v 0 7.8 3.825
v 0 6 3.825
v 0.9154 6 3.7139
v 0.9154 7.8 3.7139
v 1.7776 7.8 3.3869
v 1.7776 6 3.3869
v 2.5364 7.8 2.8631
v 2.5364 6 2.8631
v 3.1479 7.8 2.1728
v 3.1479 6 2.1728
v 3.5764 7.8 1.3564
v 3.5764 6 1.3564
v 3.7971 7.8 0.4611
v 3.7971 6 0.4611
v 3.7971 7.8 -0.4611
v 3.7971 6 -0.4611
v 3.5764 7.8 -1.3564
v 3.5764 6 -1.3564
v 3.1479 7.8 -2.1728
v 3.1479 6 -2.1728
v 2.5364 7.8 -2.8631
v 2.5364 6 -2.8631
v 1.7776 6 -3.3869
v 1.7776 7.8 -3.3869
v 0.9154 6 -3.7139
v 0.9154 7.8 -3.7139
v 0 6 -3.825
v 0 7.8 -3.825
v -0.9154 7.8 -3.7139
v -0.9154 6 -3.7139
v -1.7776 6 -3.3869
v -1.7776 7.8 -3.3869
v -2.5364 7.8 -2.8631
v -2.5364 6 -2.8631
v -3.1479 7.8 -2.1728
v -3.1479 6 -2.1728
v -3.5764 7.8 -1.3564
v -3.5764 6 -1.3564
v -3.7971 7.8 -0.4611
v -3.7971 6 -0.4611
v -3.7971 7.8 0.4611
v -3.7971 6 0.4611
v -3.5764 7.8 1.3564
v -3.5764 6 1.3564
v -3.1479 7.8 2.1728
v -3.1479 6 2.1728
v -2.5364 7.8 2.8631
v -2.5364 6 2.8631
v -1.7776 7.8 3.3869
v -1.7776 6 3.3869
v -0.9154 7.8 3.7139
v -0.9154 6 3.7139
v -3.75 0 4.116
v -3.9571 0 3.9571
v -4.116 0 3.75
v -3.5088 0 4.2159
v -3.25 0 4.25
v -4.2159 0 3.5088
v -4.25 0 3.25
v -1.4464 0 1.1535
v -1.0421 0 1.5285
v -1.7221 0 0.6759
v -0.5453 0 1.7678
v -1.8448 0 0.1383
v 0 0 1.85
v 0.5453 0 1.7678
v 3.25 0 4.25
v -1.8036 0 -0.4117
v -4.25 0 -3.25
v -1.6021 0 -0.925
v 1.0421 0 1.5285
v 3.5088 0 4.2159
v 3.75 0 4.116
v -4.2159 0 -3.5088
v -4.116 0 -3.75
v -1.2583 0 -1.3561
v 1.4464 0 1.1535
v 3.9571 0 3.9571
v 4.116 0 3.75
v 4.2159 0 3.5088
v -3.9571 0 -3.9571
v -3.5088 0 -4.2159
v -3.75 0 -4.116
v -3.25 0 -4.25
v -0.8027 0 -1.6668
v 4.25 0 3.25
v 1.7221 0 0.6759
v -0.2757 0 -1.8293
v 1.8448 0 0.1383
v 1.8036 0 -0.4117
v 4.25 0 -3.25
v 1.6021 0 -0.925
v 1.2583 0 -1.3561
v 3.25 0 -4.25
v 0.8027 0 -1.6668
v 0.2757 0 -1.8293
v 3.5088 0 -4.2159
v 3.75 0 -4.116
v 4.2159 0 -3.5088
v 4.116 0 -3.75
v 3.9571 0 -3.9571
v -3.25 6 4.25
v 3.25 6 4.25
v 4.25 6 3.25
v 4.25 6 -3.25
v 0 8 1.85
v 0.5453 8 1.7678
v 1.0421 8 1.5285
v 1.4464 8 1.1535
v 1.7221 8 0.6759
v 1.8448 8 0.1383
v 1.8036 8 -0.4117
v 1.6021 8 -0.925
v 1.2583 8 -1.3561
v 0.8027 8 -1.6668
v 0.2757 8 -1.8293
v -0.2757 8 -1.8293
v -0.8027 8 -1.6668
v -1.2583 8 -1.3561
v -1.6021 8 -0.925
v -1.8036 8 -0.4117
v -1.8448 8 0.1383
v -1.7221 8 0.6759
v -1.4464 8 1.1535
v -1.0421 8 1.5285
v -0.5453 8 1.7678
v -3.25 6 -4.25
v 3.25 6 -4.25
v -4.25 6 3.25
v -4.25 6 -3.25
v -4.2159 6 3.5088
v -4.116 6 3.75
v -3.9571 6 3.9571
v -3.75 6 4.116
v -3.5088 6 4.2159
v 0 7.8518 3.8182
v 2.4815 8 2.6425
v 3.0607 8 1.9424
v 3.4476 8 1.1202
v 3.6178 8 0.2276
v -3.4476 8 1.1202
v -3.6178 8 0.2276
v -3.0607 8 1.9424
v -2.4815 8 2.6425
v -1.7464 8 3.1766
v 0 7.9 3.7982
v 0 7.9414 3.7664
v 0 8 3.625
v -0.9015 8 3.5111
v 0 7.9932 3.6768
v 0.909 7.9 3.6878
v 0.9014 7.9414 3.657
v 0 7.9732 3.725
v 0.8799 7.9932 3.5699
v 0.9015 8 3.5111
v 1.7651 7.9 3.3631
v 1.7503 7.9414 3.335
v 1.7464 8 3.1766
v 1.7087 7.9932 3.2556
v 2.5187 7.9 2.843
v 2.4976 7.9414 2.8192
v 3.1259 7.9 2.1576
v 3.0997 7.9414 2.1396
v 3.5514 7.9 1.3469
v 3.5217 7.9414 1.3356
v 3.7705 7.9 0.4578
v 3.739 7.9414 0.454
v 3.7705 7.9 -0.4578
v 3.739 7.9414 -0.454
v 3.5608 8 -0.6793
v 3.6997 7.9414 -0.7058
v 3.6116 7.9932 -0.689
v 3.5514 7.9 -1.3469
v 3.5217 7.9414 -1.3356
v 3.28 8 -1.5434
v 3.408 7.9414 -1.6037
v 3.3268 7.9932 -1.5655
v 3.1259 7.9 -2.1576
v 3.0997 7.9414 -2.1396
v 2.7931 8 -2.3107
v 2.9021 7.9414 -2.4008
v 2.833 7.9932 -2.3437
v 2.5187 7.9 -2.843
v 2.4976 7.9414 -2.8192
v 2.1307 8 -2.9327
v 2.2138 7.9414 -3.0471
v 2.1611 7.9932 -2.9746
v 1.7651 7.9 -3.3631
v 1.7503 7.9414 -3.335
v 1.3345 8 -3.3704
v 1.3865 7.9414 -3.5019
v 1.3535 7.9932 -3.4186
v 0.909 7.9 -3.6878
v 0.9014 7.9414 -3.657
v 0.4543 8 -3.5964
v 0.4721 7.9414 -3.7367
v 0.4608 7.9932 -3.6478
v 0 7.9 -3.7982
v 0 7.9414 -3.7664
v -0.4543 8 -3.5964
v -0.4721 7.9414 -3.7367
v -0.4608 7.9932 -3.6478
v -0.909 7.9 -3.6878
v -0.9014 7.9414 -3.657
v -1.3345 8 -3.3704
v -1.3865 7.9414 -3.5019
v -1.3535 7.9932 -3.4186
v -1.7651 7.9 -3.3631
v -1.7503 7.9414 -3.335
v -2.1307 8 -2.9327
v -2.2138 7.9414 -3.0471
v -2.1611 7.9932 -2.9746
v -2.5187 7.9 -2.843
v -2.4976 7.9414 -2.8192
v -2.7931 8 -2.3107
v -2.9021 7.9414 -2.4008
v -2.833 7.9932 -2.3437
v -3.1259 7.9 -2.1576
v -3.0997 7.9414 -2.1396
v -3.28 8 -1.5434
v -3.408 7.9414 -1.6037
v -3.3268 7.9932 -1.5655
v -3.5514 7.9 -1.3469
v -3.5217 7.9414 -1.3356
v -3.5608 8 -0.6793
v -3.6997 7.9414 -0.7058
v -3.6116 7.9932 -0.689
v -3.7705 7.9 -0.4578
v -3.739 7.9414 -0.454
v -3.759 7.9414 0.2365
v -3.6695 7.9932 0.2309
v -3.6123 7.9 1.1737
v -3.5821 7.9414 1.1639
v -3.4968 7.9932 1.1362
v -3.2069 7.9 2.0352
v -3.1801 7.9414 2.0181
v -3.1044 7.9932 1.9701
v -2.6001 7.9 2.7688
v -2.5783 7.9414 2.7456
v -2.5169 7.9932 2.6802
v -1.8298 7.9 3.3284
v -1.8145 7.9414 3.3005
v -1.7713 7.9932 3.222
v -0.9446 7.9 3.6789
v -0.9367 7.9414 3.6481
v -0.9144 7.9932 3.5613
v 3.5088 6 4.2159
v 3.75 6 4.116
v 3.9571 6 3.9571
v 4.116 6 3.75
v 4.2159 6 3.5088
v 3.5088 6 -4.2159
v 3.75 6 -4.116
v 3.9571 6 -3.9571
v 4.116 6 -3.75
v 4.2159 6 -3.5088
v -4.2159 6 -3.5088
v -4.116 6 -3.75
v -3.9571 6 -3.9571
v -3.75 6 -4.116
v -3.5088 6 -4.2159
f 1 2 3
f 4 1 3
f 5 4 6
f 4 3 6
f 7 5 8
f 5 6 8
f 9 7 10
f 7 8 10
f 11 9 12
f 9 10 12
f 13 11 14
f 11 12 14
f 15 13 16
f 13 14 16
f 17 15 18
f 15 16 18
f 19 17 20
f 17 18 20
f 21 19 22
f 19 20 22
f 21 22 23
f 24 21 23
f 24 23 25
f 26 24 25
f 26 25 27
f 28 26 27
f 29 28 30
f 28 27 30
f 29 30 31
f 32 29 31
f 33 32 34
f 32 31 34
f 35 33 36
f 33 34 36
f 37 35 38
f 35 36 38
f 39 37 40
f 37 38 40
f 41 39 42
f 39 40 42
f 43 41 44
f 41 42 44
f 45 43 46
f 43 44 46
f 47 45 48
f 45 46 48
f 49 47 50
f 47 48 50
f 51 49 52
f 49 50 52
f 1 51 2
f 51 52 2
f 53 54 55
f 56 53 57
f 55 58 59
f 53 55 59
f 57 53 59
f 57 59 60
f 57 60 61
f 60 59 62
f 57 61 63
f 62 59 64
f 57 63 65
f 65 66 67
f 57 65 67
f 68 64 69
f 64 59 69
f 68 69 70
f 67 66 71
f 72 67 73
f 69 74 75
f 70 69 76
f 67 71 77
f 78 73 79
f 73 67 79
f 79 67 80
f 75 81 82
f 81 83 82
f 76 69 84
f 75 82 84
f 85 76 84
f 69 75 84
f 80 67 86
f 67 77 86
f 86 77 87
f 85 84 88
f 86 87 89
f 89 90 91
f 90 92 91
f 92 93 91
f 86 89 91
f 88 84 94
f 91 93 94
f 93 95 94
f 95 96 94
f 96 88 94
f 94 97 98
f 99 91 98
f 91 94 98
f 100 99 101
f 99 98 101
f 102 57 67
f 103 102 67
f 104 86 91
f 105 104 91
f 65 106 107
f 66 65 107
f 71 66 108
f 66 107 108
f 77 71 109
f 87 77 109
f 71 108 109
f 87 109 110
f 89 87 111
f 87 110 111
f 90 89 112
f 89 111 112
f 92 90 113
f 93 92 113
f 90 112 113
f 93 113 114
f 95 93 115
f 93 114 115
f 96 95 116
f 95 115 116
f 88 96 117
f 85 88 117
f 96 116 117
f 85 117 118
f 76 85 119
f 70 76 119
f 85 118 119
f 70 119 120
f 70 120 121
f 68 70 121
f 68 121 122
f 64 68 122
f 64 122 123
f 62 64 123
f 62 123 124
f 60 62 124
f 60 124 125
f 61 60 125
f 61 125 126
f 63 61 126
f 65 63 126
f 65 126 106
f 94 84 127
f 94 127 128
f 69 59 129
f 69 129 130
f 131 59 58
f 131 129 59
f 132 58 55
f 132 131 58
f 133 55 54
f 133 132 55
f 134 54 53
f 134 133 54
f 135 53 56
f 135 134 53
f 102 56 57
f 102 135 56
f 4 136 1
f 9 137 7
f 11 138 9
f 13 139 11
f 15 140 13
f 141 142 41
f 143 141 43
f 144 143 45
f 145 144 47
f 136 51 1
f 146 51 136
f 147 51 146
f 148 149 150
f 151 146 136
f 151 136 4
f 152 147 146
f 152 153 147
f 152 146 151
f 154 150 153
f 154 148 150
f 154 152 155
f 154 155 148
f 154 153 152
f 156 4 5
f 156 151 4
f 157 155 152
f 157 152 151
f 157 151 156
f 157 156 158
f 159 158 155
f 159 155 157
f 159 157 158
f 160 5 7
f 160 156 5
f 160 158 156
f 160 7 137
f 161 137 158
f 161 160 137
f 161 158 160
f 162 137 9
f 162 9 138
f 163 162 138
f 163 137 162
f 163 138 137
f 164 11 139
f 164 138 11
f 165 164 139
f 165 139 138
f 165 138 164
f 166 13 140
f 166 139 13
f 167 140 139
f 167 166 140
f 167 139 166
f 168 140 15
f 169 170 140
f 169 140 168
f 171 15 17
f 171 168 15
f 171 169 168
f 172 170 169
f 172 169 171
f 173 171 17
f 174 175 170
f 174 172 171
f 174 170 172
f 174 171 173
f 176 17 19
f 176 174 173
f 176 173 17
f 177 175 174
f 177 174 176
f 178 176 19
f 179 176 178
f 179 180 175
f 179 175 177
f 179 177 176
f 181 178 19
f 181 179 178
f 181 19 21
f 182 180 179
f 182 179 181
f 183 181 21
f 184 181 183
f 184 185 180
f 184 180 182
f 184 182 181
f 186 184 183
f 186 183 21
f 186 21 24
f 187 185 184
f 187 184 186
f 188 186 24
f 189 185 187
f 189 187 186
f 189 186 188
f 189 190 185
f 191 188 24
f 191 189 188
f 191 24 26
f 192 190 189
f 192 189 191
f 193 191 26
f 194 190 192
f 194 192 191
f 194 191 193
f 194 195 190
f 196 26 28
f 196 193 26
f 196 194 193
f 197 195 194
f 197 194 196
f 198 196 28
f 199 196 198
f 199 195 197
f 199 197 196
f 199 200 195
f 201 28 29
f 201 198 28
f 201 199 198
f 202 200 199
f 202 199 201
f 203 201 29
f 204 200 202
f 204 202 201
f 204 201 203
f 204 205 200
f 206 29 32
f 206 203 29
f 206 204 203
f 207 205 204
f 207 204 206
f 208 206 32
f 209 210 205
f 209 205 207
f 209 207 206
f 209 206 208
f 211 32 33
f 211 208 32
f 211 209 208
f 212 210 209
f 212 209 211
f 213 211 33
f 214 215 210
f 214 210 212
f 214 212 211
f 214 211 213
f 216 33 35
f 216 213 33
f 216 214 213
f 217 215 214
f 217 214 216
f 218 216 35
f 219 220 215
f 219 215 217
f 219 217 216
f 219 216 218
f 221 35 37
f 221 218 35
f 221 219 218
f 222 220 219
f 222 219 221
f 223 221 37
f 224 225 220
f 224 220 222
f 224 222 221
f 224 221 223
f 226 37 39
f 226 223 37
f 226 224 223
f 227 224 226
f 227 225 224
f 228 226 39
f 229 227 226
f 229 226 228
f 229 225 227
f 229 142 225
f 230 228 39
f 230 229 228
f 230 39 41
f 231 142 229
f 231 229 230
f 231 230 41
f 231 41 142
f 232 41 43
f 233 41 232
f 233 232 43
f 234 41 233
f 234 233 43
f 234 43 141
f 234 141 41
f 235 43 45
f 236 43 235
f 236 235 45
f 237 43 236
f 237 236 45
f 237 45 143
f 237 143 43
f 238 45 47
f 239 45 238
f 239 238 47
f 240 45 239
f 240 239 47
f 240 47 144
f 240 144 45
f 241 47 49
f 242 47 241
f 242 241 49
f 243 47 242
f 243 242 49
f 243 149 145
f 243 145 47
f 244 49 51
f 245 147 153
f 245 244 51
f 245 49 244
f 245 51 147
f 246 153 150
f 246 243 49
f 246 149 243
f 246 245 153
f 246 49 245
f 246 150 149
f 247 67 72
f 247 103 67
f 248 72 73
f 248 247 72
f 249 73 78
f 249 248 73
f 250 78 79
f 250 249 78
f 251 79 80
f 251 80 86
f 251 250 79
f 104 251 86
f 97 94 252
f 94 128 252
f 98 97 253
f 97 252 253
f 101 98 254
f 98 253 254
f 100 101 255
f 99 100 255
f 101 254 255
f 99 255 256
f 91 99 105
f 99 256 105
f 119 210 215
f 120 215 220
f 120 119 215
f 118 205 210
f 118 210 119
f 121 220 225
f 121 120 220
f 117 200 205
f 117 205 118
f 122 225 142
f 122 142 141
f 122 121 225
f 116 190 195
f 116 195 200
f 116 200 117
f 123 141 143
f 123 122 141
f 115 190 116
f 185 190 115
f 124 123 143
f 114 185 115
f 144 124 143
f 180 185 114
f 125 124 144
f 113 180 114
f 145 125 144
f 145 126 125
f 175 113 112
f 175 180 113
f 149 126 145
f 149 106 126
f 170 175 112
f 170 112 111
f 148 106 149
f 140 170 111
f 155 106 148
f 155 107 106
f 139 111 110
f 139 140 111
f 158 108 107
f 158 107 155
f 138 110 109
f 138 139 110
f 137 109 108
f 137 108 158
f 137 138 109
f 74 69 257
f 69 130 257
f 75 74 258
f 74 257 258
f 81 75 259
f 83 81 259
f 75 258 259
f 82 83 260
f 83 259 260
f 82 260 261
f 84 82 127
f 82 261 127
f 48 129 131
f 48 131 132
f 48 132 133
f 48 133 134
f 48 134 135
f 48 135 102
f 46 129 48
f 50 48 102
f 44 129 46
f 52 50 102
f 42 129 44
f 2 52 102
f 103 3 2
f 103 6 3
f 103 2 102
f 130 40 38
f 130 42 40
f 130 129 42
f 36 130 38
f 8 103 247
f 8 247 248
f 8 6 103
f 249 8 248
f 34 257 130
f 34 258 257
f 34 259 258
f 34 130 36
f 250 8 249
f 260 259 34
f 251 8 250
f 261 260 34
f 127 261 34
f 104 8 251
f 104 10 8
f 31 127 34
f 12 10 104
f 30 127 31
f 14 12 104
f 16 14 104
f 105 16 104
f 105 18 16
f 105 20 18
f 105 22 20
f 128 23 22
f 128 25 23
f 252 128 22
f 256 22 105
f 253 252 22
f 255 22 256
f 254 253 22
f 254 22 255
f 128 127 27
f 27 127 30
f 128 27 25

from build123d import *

# Parameters (mm, degrees)
SKETCH3_BASE_W      = 8.5
SKETCH3_BASE_H      = 8.5
BOSS_EXTRUDE1_DEPTH = 6
SKETCH5_INSERT_R    = 3.825
BOSS_EXTRUDE2_DEPTH = 2
SKETCH6_HOLE_R      = 1.85
CUT_EXTRUDE1_DEPTH  = 9
FILLET1_R           = 1
FILLET2_R           = 1
FILLET3_R           = 0.2


with BuildPart() as part:
    # Sketch3 Base → Boss-Extrude1 (new body)
    with BuildSketch(Plane(origin=(0, 0, 0), x_dir=(1, 0, 0), z_dir=(0, 1, 0))):
        Rectangle(SKETCH3_BASE_W, SKETCH3_BASE_H)
    extrude(amount=BOSS_EXTRUDE1_DEPTH)

    # Sketch5 Insert → Boss-Extrude2 (add)
    with BuildSketch(Plane(origin=(0, 6, 0), x_dir=(1, 0, 0), z_dir=(0, 1, 0))):
        with Locations(Location((0, 0, 0), (0, 0, 270))):  # turned: the seam where the file's is
            Circle(SKETCH5_INSERT_R)
    extrude(amount=BOSS_EXTRUDE2_DEPTH)

    # Sketch6 Hole → Cut-Extrude1 (cut, through all)
    with BuildSketch(Plane(origin=(0, 8, 0), x_dir=(1, 0, 0), z_dir=(0, 1, 0))):
        with Locations(Location((0, 0, 0), (0, 0, 270))):  # turned: the seam where the file's is
            Circle(SKETCH6_HOLE_R)
    extrude(amount=-CUT_EXTRUDE1_DEPTH, mode=Mode.SUBTRACT)

    # Fillet1
    fillet1_edges = [part.edges().sort_by_distance(p)[0] for p in [
        (4.25, 3, -4.25),
        (4.25, 3, 4.25),
        (-4.25, 3, 4.25),
    ]]
    fillet(fillet1_edges, radius=FILLET1_R)

    # Fillet2
    fillet2_edges = [part.edges().sort_by_distance(p)[0] for p in [
        (-4.25, 3, -4.25),
    ]]
    fillet(fillet2_edges, radius=FILLET2_R)

    # Fillet3
    fillet3_edges = [part.edges().sort_by_distance(p)[0] for p in [
        (0, 8, -3.825),
    ]]
    fillet(fillet3_edges, radius=FILLET3_R)


solid = part.part
